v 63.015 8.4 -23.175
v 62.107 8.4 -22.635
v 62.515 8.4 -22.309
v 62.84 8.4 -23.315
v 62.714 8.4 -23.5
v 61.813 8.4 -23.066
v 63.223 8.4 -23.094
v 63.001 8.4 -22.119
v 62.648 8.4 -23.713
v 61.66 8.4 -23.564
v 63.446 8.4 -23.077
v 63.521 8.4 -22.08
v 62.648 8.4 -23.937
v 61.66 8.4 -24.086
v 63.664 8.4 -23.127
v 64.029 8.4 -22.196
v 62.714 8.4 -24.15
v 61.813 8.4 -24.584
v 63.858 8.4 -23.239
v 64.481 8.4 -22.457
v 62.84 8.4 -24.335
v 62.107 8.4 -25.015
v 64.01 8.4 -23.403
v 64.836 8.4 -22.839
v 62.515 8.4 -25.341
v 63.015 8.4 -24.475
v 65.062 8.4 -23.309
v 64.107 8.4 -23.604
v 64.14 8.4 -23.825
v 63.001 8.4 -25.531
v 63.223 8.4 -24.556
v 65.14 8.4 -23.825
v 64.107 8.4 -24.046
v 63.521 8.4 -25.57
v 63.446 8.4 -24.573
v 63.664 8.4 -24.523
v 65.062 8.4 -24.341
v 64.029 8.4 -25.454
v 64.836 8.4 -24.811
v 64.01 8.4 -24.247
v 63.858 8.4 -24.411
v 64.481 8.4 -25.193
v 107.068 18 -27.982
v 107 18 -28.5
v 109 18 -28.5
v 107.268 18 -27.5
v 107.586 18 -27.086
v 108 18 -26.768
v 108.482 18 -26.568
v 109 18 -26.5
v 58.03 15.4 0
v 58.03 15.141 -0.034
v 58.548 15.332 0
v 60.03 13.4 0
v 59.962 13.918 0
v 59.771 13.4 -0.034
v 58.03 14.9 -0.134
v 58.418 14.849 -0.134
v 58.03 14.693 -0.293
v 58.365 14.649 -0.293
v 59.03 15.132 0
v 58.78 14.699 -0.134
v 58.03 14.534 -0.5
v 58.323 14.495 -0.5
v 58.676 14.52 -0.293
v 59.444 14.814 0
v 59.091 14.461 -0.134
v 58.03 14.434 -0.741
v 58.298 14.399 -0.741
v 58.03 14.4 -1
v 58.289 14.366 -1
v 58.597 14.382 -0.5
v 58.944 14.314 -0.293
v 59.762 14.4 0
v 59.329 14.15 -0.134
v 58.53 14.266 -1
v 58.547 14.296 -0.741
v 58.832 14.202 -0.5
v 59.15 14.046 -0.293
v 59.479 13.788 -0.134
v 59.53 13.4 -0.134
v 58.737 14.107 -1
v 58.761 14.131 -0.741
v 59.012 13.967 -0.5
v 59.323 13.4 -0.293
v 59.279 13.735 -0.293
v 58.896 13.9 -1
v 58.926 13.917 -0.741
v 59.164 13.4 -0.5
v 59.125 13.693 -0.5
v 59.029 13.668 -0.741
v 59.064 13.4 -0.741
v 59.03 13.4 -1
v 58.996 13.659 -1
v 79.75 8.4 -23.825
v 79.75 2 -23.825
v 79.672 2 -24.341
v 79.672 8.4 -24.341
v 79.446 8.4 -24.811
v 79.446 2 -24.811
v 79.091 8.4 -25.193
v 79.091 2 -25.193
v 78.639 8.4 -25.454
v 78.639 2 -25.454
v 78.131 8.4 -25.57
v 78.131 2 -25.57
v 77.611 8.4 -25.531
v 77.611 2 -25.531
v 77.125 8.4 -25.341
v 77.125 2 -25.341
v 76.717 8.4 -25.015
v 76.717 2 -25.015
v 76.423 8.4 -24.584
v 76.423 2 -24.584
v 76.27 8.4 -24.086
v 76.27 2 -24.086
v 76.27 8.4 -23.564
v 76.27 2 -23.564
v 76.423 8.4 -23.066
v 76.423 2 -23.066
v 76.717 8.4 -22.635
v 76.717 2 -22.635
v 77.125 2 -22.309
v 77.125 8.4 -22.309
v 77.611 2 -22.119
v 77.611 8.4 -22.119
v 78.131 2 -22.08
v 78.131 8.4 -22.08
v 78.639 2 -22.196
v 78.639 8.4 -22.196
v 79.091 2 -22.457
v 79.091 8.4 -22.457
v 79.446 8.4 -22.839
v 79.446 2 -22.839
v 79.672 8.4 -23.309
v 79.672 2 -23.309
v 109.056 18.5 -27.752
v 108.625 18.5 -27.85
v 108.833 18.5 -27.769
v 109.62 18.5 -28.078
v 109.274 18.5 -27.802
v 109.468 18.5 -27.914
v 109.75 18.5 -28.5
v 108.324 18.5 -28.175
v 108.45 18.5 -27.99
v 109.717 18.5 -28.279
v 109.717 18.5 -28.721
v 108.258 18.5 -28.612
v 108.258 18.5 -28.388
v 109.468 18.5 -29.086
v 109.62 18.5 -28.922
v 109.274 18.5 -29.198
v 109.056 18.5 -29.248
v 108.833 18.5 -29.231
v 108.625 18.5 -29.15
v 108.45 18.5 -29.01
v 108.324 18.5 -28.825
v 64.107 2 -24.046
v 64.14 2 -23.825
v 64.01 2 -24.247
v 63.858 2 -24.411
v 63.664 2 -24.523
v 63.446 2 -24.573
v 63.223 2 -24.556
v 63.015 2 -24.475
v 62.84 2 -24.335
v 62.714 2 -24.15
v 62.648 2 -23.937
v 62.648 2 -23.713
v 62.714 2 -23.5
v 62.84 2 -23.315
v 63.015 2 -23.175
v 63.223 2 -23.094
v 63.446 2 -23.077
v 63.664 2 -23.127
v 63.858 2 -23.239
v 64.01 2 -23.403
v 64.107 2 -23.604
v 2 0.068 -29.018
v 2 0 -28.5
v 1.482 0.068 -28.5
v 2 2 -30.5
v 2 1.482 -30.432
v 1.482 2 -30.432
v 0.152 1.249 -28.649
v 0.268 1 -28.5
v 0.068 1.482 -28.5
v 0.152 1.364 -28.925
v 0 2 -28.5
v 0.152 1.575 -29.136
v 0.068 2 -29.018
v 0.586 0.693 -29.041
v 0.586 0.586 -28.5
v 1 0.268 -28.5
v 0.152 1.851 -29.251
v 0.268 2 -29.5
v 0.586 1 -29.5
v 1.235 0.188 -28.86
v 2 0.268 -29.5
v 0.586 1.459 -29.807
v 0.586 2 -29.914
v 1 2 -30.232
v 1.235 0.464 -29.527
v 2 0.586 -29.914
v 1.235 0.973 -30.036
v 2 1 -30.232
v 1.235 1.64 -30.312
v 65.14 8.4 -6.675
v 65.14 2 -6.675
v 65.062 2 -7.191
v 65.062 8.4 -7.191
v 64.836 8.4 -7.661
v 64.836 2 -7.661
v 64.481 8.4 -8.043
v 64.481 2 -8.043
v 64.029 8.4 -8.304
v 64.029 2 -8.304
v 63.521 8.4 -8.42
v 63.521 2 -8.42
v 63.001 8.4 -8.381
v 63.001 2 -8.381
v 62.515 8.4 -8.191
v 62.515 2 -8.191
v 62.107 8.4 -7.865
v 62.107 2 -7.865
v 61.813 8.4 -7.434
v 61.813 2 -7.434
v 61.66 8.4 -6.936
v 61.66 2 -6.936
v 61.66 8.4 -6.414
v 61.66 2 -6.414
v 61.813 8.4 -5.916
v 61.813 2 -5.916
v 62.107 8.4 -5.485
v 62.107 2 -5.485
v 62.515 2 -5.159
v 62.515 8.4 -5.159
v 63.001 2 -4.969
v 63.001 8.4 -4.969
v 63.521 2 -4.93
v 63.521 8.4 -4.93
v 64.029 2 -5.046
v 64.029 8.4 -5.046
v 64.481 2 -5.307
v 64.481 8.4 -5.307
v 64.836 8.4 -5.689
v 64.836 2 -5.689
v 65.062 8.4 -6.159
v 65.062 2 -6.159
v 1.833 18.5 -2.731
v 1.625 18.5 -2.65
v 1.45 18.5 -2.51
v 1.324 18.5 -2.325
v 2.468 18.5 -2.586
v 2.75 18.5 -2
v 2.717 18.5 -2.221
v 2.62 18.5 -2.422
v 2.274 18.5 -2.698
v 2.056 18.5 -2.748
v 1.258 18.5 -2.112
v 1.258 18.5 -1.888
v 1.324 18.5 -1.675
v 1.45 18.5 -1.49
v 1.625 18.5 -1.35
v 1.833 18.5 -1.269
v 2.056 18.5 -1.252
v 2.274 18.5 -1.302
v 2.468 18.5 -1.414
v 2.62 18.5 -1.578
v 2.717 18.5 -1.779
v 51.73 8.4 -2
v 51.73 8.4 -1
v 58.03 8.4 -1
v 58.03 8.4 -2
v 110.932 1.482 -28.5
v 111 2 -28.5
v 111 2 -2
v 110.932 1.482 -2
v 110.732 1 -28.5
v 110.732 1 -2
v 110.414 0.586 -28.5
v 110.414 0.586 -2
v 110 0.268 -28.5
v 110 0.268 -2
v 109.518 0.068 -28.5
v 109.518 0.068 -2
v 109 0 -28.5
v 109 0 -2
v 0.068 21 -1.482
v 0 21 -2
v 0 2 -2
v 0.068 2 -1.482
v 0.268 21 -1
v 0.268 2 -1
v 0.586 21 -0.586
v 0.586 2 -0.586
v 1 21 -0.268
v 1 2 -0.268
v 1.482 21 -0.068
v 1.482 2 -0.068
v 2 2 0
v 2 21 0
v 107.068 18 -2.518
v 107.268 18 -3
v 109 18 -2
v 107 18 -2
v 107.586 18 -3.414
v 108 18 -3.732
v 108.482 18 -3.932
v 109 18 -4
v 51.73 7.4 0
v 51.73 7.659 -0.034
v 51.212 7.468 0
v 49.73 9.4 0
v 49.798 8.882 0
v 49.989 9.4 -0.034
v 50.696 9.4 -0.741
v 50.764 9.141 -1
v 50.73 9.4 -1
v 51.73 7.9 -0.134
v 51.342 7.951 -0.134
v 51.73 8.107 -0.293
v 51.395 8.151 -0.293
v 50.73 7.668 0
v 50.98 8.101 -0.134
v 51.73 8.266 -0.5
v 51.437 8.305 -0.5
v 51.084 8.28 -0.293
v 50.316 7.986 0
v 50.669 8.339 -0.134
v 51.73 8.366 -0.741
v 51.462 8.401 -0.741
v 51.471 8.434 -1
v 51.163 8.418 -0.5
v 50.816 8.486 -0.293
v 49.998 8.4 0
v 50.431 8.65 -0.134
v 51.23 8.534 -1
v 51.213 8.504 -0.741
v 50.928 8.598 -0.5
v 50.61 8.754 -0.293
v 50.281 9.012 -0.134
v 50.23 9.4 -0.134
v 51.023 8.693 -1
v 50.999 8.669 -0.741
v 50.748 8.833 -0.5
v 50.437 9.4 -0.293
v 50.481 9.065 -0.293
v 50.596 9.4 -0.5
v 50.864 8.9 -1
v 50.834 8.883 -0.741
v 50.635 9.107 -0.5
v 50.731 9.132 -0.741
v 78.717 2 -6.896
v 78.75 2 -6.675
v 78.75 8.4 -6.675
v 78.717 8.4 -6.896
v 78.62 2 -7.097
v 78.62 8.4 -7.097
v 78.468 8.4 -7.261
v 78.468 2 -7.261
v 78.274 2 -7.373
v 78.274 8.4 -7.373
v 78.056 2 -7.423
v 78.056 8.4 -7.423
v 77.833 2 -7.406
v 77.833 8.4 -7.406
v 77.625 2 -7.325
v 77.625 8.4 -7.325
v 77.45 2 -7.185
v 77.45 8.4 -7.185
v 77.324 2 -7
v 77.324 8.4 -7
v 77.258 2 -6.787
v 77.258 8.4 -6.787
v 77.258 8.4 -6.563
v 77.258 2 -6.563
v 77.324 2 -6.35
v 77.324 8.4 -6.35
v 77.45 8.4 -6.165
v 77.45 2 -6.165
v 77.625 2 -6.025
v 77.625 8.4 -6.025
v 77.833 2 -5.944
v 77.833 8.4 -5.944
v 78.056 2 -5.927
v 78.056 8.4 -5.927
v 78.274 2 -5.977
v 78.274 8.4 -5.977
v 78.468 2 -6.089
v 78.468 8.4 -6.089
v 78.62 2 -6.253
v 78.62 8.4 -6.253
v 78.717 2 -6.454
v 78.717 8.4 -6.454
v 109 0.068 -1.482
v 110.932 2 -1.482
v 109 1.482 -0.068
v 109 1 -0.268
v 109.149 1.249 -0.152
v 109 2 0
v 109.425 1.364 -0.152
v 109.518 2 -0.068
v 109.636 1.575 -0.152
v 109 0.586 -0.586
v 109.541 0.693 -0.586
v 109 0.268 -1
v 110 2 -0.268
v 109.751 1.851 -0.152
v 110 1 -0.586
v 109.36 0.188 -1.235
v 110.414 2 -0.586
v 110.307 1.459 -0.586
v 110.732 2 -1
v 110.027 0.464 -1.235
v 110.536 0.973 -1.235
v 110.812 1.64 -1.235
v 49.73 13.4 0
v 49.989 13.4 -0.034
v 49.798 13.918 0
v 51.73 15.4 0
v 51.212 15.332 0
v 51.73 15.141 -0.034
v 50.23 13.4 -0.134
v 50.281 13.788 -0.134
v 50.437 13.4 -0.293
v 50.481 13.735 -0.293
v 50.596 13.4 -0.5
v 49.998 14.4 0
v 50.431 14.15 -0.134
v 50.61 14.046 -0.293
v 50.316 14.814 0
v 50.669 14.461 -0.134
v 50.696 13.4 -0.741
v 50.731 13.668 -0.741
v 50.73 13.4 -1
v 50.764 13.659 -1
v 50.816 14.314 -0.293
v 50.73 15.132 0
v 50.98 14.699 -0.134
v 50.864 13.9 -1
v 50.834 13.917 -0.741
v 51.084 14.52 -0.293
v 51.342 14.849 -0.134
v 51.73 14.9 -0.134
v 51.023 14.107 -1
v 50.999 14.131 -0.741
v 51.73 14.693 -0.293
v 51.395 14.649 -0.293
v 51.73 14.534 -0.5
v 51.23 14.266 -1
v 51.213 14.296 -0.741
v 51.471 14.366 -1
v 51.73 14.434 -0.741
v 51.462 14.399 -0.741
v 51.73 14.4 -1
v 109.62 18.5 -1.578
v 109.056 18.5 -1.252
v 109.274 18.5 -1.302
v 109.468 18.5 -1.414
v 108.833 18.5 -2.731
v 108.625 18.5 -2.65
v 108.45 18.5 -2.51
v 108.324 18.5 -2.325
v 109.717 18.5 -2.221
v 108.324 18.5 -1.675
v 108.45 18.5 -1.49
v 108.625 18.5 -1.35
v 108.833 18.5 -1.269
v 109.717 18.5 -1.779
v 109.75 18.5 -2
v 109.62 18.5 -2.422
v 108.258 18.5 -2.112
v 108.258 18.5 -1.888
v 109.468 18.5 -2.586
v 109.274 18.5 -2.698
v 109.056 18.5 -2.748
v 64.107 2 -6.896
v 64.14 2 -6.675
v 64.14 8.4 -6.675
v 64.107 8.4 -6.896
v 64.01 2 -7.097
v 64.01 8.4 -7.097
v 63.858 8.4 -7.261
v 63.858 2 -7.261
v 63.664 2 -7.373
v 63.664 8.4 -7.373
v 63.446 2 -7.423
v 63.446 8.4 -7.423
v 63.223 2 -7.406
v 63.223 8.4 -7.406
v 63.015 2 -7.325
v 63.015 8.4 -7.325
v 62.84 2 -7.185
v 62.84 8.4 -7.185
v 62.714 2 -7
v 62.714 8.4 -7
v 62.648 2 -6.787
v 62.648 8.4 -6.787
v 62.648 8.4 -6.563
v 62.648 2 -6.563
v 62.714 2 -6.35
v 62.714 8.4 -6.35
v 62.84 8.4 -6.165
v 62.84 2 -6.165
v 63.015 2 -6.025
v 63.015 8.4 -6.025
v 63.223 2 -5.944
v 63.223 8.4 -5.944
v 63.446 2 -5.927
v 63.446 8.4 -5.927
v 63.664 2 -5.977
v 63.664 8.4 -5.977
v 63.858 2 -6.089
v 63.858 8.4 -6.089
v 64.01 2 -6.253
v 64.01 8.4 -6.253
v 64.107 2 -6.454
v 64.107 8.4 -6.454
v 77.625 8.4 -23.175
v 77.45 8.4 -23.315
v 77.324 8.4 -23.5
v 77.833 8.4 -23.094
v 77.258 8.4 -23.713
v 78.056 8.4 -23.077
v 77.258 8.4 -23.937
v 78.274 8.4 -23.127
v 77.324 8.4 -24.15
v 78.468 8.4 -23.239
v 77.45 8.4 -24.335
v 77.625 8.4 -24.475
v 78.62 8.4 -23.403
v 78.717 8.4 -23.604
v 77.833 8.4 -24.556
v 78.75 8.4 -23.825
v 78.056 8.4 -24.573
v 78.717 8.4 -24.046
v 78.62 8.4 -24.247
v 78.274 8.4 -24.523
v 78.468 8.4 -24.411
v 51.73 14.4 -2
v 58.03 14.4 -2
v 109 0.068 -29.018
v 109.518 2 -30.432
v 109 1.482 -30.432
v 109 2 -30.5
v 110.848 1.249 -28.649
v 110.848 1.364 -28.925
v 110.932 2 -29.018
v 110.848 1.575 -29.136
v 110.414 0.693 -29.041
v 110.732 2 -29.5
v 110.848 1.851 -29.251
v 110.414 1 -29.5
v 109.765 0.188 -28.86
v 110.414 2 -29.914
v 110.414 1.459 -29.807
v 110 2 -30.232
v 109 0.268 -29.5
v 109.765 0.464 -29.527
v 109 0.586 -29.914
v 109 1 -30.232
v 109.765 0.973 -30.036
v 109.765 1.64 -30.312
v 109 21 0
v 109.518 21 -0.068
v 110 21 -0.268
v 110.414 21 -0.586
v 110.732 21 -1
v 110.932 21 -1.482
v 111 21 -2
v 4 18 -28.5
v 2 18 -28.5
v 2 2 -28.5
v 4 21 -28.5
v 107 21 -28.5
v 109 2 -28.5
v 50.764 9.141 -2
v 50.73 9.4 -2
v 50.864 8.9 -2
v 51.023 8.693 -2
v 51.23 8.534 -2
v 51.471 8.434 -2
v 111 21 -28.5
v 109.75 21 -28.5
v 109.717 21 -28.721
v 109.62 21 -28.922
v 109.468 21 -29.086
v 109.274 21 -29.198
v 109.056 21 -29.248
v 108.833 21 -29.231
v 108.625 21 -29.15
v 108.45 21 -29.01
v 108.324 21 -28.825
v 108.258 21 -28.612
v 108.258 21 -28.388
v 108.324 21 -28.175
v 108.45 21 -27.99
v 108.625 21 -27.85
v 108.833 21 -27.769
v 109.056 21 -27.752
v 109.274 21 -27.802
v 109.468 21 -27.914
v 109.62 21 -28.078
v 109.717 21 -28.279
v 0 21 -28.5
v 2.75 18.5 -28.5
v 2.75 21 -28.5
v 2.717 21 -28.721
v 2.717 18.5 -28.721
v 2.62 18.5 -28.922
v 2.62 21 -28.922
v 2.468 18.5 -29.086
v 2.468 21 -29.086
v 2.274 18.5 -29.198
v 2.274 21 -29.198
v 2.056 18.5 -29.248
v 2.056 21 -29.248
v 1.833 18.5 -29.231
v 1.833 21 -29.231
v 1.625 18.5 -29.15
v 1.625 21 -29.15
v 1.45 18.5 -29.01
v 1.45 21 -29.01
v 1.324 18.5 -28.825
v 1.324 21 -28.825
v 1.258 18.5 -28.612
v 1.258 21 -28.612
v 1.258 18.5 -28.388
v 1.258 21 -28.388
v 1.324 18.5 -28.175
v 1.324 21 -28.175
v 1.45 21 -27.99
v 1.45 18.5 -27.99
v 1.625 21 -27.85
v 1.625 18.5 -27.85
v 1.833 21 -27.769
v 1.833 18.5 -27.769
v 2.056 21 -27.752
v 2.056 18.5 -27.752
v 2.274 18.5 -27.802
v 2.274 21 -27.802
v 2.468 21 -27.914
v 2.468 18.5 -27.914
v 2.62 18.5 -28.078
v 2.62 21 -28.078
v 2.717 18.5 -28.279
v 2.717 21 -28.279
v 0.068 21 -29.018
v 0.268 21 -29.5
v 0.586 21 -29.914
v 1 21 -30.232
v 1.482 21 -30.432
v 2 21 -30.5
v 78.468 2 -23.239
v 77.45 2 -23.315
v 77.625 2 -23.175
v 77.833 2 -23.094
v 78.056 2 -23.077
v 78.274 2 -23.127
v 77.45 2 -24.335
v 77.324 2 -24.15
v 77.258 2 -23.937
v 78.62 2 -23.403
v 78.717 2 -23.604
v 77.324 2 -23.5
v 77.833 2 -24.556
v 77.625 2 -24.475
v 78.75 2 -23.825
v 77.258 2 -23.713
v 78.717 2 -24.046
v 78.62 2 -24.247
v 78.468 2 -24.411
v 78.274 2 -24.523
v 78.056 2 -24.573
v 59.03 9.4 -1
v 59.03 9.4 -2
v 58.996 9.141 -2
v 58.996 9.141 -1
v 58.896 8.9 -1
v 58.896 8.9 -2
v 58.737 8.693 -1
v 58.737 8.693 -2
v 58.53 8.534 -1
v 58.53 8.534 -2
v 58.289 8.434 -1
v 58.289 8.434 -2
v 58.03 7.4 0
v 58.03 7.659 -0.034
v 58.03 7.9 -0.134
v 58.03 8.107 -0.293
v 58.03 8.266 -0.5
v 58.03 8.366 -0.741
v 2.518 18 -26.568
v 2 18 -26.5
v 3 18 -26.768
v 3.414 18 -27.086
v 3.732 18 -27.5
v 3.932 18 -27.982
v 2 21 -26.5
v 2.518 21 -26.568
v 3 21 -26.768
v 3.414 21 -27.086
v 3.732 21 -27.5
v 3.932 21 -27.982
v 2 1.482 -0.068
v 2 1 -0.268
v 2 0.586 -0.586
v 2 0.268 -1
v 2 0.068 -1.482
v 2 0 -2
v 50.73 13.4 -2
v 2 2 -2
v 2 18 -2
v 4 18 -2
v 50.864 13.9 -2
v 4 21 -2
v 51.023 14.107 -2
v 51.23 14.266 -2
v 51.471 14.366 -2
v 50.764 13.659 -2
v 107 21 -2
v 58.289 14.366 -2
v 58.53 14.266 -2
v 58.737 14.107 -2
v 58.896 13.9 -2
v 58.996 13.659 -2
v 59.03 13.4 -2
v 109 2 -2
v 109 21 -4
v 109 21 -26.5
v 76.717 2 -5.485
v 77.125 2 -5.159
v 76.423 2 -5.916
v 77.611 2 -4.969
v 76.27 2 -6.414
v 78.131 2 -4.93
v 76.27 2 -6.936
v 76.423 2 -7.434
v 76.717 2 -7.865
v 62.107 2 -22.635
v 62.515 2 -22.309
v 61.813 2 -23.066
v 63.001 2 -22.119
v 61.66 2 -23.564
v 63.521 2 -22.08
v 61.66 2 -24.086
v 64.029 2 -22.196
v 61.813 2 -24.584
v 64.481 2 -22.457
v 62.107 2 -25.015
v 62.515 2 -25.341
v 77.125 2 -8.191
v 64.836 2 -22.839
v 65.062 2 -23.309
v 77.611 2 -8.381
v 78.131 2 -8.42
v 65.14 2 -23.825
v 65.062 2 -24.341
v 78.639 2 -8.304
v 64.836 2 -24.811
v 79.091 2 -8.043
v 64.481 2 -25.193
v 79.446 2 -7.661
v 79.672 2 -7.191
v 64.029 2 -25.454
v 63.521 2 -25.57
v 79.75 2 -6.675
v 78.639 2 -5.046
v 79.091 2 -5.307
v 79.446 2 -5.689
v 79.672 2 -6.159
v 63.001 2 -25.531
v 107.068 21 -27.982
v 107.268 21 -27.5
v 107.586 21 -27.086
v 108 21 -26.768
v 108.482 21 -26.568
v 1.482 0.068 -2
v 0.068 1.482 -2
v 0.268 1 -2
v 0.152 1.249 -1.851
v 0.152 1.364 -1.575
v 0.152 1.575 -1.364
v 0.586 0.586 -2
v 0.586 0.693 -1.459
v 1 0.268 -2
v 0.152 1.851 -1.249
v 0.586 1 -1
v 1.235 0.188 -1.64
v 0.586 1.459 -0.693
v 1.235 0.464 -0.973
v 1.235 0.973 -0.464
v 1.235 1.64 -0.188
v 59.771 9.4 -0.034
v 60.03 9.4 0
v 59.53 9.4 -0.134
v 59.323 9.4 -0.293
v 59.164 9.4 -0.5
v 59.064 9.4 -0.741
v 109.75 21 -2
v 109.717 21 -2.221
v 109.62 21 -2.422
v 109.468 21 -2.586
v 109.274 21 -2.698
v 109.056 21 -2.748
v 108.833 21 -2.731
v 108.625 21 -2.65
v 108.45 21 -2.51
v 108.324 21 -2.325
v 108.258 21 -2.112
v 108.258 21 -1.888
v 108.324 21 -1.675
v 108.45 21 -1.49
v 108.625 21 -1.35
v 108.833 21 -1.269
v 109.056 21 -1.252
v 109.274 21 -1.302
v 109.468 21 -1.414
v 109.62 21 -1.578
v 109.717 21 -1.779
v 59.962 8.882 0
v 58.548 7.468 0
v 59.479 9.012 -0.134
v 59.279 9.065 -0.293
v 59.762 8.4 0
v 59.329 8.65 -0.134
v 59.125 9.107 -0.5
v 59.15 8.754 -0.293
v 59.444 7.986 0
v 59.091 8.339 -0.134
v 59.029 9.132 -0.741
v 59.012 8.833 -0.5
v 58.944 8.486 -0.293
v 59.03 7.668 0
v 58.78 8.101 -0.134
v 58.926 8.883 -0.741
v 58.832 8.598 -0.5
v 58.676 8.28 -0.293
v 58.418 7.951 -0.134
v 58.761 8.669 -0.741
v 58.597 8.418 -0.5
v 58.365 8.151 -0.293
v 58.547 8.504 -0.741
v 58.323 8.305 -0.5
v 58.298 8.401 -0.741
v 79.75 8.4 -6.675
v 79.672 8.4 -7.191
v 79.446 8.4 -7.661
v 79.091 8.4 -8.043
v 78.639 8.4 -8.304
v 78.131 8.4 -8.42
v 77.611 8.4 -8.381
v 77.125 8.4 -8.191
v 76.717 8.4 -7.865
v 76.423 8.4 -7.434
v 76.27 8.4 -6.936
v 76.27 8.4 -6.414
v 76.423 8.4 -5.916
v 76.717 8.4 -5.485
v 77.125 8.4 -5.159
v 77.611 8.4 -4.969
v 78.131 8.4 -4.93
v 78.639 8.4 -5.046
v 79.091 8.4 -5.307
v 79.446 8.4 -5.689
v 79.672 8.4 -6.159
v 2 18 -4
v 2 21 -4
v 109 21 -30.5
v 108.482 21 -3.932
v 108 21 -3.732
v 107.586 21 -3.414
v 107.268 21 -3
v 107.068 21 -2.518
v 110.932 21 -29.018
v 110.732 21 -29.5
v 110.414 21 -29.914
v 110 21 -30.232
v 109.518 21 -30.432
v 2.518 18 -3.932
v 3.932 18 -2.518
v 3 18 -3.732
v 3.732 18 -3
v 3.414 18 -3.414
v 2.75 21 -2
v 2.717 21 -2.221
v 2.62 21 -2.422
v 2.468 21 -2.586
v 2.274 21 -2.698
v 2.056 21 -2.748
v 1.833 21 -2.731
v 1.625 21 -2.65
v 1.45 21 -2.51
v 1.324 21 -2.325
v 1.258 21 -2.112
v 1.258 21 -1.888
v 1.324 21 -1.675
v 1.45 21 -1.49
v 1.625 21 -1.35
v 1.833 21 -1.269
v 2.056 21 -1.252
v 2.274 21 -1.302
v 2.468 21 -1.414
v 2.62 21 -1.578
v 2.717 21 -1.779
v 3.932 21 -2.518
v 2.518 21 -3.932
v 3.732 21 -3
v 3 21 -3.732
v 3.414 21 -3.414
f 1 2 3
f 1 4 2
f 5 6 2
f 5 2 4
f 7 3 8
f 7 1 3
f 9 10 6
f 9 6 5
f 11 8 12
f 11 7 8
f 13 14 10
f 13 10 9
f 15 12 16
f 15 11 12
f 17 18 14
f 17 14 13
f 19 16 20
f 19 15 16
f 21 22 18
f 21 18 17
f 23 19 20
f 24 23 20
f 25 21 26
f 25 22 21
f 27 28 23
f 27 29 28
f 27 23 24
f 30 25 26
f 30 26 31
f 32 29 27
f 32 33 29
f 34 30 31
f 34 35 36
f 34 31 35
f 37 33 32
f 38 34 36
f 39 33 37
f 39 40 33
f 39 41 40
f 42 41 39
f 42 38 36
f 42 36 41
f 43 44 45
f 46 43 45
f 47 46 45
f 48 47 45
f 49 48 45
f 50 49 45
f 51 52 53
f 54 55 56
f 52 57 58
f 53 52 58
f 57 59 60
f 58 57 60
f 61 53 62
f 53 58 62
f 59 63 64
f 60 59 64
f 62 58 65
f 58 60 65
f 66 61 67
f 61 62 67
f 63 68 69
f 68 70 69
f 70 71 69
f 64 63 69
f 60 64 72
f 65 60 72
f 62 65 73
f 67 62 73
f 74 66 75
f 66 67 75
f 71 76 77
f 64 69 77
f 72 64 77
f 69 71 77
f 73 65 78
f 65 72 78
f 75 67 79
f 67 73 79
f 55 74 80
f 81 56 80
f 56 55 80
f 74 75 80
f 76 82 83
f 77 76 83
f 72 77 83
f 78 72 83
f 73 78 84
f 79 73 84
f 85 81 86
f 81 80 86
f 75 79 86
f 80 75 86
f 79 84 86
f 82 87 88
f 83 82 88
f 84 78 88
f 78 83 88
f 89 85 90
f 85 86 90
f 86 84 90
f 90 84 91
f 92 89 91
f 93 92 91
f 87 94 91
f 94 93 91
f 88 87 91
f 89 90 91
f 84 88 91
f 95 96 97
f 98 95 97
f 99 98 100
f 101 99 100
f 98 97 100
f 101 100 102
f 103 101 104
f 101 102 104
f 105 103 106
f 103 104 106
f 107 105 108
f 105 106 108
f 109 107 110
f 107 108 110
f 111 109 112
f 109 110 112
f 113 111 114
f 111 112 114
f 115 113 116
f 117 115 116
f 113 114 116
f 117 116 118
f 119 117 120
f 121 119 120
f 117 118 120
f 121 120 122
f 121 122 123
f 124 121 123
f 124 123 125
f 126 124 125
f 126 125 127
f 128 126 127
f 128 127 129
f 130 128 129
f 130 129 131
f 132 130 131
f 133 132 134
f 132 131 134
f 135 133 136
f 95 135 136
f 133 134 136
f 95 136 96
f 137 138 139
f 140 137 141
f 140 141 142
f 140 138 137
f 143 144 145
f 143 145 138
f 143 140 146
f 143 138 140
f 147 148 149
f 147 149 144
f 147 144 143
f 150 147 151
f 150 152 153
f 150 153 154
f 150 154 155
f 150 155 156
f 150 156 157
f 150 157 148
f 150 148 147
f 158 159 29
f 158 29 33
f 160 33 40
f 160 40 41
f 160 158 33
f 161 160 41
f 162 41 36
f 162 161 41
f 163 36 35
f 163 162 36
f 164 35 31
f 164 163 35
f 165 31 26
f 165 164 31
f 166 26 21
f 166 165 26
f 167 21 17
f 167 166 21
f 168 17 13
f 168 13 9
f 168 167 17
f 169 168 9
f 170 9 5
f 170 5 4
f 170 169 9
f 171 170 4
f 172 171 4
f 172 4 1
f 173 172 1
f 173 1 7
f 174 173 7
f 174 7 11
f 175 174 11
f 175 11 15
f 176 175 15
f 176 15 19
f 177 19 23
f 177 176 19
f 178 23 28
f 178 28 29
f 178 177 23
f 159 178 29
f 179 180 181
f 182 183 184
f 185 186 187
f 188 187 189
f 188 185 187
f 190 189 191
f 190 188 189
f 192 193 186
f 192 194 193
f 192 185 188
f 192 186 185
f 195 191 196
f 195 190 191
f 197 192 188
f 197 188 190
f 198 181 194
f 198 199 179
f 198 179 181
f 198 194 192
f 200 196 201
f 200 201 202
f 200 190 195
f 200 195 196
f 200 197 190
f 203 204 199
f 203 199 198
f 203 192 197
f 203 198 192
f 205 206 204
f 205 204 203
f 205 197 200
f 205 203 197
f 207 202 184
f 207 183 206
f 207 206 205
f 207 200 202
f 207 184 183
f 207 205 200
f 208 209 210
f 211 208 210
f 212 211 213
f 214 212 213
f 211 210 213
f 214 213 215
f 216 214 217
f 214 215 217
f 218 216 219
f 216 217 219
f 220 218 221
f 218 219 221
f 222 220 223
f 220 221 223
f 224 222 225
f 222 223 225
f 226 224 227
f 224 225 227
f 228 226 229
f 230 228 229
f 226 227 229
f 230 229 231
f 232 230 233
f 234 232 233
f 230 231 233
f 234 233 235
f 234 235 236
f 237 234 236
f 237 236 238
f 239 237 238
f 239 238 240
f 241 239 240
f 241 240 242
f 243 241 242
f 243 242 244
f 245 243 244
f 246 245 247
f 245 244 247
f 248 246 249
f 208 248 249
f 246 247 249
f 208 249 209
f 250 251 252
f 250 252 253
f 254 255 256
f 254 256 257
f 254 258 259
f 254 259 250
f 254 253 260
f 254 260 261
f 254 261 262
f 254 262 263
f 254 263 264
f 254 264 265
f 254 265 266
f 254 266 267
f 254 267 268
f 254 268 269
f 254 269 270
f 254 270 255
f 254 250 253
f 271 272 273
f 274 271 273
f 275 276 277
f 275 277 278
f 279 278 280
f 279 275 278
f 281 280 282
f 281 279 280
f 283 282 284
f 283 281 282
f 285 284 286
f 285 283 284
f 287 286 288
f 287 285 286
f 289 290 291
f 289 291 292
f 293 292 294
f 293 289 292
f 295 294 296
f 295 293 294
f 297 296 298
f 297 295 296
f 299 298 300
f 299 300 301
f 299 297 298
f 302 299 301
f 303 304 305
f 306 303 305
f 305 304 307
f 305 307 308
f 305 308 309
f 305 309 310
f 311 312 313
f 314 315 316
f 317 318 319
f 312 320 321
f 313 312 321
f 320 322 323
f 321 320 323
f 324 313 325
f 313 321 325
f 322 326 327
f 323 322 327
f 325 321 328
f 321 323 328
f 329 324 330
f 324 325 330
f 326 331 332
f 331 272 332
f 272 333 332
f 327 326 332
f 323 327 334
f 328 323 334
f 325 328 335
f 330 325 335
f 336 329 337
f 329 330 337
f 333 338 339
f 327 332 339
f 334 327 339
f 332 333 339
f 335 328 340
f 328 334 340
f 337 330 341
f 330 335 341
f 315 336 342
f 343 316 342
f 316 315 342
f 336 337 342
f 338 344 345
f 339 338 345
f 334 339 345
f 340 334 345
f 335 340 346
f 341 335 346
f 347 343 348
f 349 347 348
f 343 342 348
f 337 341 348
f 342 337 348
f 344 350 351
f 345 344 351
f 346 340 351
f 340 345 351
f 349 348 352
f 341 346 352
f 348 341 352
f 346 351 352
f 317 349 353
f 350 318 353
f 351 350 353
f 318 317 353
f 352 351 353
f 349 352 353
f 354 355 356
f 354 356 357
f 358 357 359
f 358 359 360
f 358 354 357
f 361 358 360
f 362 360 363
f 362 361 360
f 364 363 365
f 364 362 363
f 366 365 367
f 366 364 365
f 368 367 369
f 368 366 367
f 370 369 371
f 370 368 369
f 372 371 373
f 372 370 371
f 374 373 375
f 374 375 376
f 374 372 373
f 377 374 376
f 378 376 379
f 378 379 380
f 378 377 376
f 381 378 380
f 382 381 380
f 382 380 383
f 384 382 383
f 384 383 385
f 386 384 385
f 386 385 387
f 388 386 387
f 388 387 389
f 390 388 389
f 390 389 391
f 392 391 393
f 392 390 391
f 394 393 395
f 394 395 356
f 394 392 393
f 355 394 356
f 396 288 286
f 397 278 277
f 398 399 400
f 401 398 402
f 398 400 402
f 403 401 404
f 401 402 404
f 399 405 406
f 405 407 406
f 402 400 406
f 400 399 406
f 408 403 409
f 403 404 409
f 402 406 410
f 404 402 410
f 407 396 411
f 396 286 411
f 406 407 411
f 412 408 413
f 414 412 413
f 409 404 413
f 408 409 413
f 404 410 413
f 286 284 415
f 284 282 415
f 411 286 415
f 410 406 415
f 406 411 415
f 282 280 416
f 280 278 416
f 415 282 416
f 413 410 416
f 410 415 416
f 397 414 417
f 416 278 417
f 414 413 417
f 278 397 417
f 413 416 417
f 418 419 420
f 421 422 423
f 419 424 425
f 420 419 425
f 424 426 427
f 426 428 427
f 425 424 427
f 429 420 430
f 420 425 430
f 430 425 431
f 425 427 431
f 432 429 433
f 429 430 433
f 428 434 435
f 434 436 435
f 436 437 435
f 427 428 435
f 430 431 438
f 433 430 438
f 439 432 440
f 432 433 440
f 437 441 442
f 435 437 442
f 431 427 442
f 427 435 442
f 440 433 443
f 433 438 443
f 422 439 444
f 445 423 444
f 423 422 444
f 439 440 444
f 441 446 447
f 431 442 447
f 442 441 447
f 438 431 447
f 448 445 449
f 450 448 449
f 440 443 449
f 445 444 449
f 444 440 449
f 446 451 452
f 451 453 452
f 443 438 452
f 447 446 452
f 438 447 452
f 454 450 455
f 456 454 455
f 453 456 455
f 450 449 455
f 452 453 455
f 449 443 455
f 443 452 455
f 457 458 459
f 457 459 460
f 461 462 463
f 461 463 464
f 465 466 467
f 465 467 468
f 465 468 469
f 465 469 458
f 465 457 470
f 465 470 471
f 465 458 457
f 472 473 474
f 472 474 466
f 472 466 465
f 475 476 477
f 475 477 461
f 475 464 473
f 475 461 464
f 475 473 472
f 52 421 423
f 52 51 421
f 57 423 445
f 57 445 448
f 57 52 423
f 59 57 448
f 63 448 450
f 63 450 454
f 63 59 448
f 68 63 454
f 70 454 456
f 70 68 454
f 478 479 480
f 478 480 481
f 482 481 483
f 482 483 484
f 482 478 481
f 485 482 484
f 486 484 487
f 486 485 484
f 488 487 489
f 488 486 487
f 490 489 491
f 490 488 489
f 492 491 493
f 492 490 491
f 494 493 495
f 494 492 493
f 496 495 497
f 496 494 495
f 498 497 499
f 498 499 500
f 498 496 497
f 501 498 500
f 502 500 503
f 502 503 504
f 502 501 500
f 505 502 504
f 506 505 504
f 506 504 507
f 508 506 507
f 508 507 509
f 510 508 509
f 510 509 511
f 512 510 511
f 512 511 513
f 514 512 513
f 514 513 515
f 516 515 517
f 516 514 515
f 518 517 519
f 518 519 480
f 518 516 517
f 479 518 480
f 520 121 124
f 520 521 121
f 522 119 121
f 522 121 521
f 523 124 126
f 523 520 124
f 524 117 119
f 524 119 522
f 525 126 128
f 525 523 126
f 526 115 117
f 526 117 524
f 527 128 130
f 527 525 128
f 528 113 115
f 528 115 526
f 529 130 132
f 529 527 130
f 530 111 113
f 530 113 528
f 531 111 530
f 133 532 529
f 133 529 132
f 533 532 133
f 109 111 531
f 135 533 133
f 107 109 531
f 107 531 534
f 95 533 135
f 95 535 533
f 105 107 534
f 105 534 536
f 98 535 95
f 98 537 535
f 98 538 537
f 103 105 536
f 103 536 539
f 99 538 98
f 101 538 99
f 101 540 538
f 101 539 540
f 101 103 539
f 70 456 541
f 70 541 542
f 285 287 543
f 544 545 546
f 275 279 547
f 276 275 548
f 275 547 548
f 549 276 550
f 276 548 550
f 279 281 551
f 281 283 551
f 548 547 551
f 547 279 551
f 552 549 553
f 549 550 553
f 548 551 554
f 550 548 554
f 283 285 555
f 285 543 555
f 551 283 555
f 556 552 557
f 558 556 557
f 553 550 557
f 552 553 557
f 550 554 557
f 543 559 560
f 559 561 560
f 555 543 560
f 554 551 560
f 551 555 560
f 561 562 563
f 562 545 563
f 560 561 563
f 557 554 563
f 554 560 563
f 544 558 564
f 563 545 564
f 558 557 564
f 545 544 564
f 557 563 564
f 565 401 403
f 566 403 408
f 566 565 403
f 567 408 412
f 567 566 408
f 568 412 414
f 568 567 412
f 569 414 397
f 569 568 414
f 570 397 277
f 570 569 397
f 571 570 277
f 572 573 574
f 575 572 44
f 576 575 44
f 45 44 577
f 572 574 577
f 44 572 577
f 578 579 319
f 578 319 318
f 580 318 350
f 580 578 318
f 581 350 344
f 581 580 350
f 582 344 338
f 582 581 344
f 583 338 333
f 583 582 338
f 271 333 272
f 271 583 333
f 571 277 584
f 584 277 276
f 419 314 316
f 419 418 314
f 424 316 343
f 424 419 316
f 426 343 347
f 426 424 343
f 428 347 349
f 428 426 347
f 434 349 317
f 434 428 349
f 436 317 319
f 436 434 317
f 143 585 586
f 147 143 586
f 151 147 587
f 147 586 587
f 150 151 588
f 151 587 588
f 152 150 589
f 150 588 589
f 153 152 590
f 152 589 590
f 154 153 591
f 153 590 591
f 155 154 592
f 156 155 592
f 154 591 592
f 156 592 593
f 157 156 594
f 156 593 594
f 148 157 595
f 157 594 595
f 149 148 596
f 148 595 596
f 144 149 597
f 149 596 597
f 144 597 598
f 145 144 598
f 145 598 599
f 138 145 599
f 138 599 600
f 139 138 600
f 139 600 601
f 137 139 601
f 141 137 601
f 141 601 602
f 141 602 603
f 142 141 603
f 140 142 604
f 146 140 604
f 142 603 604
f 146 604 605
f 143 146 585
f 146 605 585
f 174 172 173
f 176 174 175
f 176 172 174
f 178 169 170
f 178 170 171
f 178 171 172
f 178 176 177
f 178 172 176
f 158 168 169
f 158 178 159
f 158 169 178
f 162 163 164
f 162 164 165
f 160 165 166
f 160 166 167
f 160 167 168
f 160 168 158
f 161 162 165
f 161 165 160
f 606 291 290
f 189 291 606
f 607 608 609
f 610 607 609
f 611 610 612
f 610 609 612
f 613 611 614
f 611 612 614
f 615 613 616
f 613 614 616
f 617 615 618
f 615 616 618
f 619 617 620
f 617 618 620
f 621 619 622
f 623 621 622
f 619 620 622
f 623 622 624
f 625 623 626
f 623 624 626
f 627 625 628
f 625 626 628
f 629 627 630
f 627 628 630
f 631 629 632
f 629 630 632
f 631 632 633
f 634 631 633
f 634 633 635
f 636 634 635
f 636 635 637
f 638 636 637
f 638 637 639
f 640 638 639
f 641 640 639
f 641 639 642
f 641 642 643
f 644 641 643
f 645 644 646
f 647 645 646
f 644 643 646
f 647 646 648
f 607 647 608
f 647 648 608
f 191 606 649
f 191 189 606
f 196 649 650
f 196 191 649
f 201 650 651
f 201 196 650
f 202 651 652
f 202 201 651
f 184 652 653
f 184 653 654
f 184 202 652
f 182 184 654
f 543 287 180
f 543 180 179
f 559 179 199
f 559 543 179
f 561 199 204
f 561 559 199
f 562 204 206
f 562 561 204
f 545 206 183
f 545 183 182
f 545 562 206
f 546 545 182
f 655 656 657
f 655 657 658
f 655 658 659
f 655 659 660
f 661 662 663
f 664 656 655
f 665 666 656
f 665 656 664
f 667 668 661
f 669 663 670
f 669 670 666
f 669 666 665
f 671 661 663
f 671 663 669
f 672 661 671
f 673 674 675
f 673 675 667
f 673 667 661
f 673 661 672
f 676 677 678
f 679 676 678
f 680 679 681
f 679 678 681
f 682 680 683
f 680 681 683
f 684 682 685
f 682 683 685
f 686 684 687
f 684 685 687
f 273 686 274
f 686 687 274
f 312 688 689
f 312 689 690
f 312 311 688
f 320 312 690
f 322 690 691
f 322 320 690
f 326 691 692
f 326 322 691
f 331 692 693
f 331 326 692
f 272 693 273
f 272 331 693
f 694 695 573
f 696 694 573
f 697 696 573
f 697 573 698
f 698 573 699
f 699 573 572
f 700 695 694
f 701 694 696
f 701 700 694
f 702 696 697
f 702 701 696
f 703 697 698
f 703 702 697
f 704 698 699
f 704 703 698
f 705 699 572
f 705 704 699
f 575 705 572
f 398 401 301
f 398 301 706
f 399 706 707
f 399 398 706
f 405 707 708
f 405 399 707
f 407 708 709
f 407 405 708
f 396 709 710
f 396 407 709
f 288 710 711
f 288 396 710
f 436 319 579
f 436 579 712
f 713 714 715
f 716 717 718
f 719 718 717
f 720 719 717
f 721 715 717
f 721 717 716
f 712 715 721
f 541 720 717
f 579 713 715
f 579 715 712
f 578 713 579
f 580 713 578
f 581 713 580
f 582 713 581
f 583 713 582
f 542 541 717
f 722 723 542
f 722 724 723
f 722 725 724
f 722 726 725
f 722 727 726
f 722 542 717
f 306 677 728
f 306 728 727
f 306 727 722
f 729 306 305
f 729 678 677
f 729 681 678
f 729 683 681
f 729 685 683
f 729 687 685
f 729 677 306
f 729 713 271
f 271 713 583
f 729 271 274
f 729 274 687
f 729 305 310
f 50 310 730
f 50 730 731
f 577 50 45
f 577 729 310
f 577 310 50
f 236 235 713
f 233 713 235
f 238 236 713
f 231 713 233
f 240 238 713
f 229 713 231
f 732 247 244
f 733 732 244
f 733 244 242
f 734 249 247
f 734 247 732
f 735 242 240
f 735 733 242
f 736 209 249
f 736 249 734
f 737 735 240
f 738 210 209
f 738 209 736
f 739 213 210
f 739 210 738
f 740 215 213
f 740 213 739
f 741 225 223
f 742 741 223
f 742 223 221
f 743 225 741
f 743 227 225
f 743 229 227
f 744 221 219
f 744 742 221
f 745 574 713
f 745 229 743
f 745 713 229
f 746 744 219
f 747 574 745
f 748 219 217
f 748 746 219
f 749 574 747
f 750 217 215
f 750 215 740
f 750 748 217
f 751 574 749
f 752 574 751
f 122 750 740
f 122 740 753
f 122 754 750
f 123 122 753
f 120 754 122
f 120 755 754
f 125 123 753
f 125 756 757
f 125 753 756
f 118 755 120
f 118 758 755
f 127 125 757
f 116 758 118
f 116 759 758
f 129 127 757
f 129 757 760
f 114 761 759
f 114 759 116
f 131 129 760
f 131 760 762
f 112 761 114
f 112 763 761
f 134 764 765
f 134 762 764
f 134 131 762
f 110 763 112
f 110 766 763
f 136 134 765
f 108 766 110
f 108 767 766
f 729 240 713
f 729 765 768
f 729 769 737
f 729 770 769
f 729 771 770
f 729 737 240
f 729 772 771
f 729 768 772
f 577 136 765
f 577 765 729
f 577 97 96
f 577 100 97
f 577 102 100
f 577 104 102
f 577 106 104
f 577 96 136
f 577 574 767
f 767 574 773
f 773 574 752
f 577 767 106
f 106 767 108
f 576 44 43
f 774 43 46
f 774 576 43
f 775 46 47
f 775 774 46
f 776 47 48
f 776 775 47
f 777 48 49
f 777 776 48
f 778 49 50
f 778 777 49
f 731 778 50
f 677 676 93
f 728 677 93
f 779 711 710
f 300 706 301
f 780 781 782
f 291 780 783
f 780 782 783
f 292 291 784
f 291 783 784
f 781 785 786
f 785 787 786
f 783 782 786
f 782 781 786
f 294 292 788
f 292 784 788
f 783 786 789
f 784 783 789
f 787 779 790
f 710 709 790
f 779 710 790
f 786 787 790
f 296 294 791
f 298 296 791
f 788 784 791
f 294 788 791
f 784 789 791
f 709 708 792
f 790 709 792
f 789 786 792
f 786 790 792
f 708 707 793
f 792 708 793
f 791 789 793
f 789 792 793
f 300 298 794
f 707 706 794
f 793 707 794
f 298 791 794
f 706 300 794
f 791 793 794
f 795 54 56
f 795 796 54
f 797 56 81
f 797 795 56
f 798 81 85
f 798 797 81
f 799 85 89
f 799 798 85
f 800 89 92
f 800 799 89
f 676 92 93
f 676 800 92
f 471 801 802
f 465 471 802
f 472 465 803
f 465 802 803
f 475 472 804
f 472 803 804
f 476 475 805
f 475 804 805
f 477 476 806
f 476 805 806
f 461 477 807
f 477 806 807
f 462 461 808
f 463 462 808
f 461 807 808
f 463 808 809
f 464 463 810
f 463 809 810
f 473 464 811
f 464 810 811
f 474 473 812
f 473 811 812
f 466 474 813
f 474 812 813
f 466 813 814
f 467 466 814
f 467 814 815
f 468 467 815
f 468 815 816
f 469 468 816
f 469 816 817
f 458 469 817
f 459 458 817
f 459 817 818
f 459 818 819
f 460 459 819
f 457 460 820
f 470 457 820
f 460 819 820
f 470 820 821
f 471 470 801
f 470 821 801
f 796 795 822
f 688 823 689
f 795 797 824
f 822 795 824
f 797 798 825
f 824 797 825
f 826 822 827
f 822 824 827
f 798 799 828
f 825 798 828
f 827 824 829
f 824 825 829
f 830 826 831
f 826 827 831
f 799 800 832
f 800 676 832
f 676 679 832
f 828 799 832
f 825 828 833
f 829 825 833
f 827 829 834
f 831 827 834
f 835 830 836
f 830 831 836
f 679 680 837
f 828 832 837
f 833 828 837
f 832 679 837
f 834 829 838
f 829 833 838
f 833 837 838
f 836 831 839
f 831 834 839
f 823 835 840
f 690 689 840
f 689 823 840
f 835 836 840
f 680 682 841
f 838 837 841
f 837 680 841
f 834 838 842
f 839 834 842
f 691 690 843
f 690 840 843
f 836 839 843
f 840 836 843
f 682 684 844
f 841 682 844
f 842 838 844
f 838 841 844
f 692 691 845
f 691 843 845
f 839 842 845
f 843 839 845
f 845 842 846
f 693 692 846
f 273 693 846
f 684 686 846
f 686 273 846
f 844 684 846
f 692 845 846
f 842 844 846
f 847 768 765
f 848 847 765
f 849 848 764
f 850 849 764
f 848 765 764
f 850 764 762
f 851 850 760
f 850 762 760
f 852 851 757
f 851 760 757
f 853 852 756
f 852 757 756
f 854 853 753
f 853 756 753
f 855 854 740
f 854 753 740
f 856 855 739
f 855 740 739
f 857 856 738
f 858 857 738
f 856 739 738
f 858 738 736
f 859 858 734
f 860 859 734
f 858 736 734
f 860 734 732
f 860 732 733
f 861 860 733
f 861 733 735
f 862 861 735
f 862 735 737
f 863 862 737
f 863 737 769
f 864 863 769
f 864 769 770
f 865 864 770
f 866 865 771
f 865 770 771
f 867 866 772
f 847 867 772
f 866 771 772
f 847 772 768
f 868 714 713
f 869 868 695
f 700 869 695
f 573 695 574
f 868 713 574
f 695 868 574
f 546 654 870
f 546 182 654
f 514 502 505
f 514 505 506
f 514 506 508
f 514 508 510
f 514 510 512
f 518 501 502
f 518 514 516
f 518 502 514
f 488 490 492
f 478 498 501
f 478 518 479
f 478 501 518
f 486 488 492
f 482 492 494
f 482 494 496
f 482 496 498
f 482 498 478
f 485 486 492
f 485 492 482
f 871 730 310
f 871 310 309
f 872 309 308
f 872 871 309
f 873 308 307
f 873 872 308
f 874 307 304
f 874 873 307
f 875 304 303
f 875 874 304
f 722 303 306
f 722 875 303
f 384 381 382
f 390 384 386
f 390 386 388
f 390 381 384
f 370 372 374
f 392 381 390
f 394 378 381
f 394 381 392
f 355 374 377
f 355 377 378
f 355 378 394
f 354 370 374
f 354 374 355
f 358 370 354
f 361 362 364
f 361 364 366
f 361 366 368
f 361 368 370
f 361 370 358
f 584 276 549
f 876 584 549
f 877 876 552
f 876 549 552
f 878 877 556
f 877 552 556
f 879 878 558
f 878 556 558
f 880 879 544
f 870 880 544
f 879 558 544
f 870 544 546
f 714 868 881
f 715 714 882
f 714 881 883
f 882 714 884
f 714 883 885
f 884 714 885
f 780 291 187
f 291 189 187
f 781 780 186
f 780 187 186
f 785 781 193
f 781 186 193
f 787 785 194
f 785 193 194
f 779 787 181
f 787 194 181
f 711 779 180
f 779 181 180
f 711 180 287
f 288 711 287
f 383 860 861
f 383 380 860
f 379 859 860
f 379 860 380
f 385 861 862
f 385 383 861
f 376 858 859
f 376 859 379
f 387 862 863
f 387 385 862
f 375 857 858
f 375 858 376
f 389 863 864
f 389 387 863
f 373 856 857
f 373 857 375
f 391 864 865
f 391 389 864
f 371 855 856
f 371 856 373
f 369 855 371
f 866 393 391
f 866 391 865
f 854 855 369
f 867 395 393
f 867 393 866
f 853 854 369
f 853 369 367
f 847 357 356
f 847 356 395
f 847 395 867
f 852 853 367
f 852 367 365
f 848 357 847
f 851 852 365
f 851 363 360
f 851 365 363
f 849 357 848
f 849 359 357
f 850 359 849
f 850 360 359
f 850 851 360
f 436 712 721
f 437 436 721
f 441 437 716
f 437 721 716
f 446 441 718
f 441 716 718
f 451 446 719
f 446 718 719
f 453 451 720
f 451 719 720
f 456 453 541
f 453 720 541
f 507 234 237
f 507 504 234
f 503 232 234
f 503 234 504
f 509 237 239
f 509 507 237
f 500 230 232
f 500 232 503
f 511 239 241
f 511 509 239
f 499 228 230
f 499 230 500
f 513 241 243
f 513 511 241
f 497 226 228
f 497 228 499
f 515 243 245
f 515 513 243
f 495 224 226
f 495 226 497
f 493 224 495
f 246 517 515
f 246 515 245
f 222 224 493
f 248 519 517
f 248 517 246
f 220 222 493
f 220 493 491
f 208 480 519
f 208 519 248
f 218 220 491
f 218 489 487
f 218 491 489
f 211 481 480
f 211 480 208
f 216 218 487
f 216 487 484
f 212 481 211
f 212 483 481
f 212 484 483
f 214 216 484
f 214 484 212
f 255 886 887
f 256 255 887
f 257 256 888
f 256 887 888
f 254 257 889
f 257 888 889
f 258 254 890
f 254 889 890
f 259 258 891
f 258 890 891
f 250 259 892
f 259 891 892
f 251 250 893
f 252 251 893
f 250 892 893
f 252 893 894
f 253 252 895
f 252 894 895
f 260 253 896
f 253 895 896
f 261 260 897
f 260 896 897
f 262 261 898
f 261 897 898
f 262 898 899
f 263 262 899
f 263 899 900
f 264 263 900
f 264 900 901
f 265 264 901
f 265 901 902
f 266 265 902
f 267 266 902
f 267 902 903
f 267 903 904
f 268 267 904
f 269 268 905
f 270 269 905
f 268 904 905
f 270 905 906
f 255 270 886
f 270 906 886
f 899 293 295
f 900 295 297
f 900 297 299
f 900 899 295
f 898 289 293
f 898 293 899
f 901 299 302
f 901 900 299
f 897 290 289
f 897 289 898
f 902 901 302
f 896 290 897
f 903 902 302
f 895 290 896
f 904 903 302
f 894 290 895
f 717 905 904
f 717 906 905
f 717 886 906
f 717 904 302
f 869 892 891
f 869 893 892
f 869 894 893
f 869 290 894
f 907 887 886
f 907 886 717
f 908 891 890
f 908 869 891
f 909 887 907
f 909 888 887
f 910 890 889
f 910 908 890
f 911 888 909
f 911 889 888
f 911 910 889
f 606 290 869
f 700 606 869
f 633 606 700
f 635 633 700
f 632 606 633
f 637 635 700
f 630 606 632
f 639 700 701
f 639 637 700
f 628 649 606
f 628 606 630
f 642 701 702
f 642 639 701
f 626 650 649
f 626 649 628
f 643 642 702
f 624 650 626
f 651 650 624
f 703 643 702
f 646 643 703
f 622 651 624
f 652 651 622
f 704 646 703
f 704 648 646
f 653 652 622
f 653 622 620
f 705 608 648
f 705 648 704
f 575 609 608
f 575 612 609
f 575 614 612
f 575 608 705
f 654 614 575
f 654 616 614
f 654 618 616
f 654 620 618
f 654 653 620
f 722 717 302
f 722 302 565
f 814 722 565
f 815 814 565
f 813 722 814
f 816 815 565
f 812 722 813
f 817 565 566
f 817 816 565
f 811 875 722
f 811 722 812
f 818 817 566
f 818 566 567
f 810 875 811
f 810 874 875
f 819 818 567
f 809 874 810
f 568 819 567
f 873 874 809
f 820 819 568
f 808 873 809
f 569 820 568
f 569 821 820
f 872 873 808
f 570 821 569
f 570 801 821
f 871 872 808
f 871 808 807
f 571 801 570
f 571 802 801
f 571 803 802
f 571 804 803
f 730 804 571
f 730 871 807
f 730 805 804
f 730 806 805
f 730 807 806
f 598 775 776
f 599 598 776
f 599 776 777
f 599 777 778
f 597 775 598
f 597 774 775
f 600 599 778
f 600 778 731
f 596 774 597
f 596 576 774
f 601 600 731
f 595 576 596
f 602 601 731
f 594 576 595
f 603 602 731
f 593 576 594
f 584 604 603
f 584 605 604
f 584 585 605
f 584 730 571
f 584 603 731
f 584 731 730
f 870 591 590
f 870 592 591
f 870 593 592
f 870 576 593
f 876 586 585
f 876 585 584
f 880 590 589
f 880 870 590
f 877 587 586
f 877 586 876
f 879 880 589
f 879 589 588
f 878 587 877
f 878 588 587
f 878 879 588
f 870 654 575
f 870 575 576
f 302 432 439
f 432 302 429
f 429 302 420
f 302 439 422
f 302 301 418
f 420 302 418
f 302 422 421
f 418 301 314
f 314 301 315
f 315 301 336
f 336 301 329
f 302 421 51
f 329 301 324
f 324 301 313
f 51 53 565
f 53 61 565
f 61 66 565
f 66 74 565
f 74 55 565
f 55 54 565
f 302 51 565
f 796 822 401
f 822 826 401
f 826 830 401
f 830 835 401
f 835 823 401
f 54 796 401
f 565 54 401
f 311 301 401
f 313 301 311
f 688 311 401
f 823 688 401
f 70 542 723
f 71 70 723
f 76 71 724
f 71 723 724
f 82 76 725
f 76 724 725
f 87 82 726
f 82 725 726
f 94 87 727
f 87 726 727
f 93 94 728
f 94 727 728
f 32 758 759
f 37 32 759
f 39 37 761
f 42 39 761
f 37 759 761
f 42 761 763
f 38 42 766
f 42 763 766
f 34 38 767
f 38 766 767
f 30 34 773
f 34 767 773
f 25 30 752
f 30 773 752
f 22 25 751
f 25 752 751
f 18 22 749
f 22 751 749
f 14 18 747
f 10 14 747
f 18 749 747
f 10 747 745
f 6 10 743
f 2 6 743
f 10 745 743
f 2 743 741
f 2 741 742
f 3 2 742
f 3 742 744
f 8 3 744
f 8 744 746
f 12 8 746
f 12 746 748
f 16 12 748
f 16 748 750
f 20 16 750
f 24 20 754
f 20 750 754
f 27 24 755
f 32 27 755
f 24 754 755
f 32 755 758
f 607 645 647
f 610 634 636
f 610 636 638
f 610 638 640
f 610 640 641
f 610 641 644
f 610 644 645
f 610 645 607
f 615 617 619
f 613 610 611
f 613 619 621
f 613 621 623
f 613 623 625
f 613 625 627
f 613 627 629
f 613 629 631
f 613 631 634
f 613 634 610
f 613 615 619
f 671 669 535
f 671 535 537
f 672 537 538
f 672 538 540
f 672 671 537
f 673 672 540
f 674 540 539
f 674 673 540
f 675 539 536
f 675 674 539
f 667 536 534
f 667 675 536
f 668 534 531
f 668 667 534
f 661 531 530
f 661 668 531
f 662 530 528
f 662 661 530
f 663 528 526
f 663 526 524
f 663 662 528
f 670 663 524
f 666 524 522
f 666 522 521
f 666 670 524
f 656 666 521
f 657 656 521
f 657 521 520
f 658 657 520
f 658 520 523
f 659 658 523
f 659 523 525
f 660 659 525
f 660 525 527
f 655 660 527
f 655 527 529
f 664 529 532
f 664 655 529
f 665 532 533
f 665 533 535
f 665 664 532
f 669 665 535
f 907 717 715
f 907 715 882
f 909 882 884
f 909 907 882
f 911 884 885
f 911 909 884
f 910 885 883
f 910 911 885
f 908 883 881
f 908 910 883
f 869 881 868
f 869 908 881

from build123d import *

# Parameters (mm, degrees)
SKETCH1_W           = 111
SKETCH1_H           = 30.5
BOSS_EXTRUDE1_DEPTH = 2
SKETCH2_W           = 111
SKETCH2_H           = 30.5
SKETCH2_W_2         = 107
SKETCH2_H_2         = 26.5
BOSS_EXTRUDE2_DEPTH = 19
FILLET1_R           = 2
SKETCH4_R           = 2
BOSS_EXTRUDE4_DEPTH = 3
SKETCH5_R           = 1.75
SKETCH5_R_2         = 0.75
BOSS_EXTRUDE5_DEPTH = 6.4
SKETCH6_W           = 8.3
SKETCH6_H           = 6
CUT_EXTRUDE1_DEPTH  = 2
FILLET2_R           = 1
SKETCH7_R           = 0.75
CUT_EXTRUDE3_DEPTH  = 2.5
FILLET3_R           = 1


with BuildPart() as part:
    # Sketch1 → Boss-Extrude1 (new body)
    with BuildSketch(Plane(origin=(0, 0, 0), x_dir=(1, 0, 0), z_dir=(0, 1, 0))):
        with Locations((55.5, 15.25)):
            Rectangle(SKETCH1_W, SKETCH1_H)
    extrude(amount=BOSS_EXTRUDE1_DEPTH)

    # Sketch2 → Boss-Extrude2 (add)
    with BuildSketch(Plane(origin=(0, 2, 0), x_dir=(1, 0, 0), z_dir=(0, 1, 0))):
        with Locations((55.5, 15.25)):
            Rectangle(SKETCH2_W, SKETCH2_H)
        with Locations((55.5, 15.25)):
            Rectangle(SKETCH2_W_2, SKETCH2_H_2, mode=Mode.SUBTRACT)
    extrude(amount=BOSS_EXTRUDE2_DEPTH)

    # Fillet1
    fillet1_edges = [part.edges().sort_by_distance(p)[0] for p in [
        (55.5, 0, -30.5),
        (111, 0, -15.25),
        (55.5, 0, 0),
        (0, 0, -15.25),
        (0, 10.5, -30.5),
        (111, 10.5, -30.5),
        (111, 10.5, 0),
        (0, 10.5, 0),
    ]]
    fillet(fillet1_edges, radius=FILLET1_R)

    # Sketch4 → Boss-Extrude4 (add)
    with BuildSketch(Plane(origin=(0, 21, 0), x_dir=(1, 0, 0), z_dir=(0, 1, 0))):
        with Locations((2, 28.5)):
            Circle(SKETCH4_R)
        with Locations((2, 2)):
            Circle(SKETCH4_R)
        with Locations((109, 2)):
            Circle(SKETCH4_R)
        with Locations((109, 28.5)):
            Circle(SKETCH4_R)
    extrude(amount=-BOSS_EXTRUDE4_DEPTH)

    # Sketch5 → Boss-Extrude5 (add)
    with BuildSketch(Plane(origin=(0, 2, 0), x_dir=(1, 0, 0), z_dir=(0, 1, 0))):
        with Locations((63.39, 23.825)):
            Circle(SKETCH5_R)
        with Locations((63.39, 23.825)):
            Circle(SKETCH5_R_2, mode=Mode.SUBTRACT)
        with Locations((63.39, 6.675)):
            Circle(SKETCH5_R)
        with Locations((63.39, 6.675)):
            Circle(SKETCH5_R_2, mode=Mode.SUBTRACT)
        with Locations((78, 6.675)):
            Circle(SKETCH5_R)
        with Locations((78, 6.675)):
            Circle(SKETCH5_R_2, mode=Mode.SUBTRACT)
        with Locations((78, 23.825)):
            Circle(SKETCH5_R)
        with Locations((78, 23.825)):
            Circle(SKETCH5_R_2, mode=Mode.SUBTRACT)
    extrude(amount=BOSS_EXTRUDE5_DEPTH)

    # Sketch6 → Cut-Extrude1 (cut)
    with BuildSketch(Plane.XY):
        with Locations((54.88, 11.4)):
            Rectangle(SKETCH6_W, SKETCH6_H)
    extrude(amount=-CUT_EXTRUDE1_DEPTH, mode=Mode.SUBTRACT)

    # Fillet2
    fillet2_edges = [part.edges().sort_by_distance(p)[0] for p in [
        (59.03, 8.4, -1),
        (59.03, 14.4, -1),
        (50.73, 14.4, -1),
        (50.73, 8.4, -1),
    ]]
    fillet(fillet2_edges, radius=FILLET2_R)

    # Sketch7 → Cut-Extrude3 (cut)
    with BuildSketch(Plane(origin=(0, 21, 0), x_dir=(1, 0, 0), z_dir=(0, 1, 0))):
        with Locations((2, 28.5)):
            Circle(SKETCH7_R)
        with Locations((2, 2)):
            Circle(SKETCH7_R)
        with Locations((109, 2)):
            Circle(SKETCH7_R)
        with Locations((109, 28.5)):
            Circle(SKETCH7_R)
    extrude(amount=-CUT_EXTRUDE3_DEPTH, mode=Mode.SUBTRACT)

    # Fillet3
    fillet3_edges = [part.edges().sort_by_distance(p)[0] for p in [
        (54.88, 14.4, 0),
        (59.03, 11.4, 0),
        (50.73, 11.4, 0),
        (54.88, 8.4, 0),
        (58.737106781, 14.107106781, 0),
        (51.022893219, 14.107106781, 0),
        (51.022893219, 8.692893219, 0),
        (58.737106781, 8.692893219, 0),
    ]]
    fillet(fillet3_edges, radius=FILLET3_R)


solid = part.part
